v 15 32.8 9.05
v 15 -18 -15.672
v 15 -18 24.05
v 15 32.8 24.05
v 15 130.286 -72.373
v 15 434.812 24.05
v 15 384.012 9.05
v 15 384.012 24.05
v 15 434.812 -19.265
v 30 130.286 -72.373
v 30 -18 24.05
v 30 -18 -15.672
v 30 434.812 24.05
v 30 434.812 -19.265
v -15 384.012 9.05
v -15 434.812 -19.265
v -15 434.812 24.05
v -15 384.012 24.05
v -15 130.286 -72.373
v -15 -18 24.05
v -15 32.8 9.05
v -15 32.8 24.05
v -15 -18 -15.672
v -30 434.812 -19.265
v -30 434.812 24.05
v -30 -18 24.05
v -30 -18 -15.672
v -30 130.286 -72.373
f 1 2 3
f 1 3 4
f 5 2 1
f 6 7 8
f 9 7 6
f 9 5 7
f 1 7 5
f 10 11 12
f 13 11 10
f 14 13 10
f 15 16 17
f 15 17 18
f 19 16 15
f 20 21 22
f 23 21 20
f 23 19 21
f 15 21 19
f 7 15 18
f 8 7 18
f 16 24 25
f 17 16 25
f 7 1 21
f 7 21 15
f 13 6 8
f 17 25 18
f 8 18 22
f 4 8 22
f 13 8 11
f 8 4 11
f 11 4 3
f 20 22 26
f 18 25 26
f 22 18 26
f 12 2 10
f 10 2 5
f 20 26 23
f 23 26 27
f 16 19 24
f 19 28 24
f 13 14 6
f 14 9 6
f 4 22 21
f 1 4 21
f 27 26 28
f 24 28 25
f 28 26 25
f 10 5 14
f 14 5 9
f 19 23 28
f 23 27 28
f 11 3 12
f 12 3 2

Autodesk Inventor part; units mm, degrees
ref_plane "YZ Plane" through (0, 0, 0) normal (1, 0, 0) x (0, 1, 0)
ref_plane "XZ Plane" through (0, 0, 0) normal (0, 1, 0) x (-1, 0, 0)
ref_plane "XY Plane" through (0, 0, 0) normal (0, 0, 1) x (1, 0, 0)
sketch "BoundingBox" plane through (0, 0, 0) normal (1, 0, 0) x (0, 1, 0)
  line L0 (434.8115, 24.0504) -> (-18, 24.0504)
  line L1 (-18, 24.0504) -> (-18, -15.6719)
  line L2 (-18, -15.6719) -> (130.2861, -72.3729)
  line L3 (130.2861, -72.3729) -> (434.8115, -19.2646)
  line L4 (434.8115, -19.2646) -> (434.8115, 24.0504)
  point P0 (0, 0)
  point P1 (417.3115, 0.6447)
  point P2 (-18, 4.1892)
  dimension "d5" = 24.0504
  dimension "d6" = 4.1893
  dimension "d7" = 110.926
  dimension "d8" = 452.8115
  dimension "d9" = 39.7223
  dimension "d10" = 43.315
  dimension "d11" = 99.893
  dimension "d12" = 56.7009
  dimension "d13" = 17.5
  dimension "d14" = 23.4057
extrude "BoundingBoxFeature" add sketch "BoundingBox" along normal mid plane 60
sketch "ForearmSpace" plane through (0, 0, 0) normal (0, 0, 1) x (1, 0, 0)
  line L0 (15, 142.9861) -> (-15, 142.9861)
  line L1 (-15, 142.9861) -> (-15, 434.8115)
  line L2 (-15, 434.8115) -> (15, 434.8115)
  line L3 (15, 434.8115) -> (15, 142.9861)
  line L4 (-30, 434.8115) -> (30, 434.8115) projected
  line L5 (0, -86.9623) -> (0, 521.7738) projected
  line L6 (30, 130.2861) -> (30, 434.8115) projected
  line L7 (-30, 130.2861) -> (30, 130.2861) projected
  line L8 (-30, 434.8115) -> (-30, 130.2861) projected
  line L9 (15, 142.9861) -> (-15, 142.9861)
  line L10 (-15, 142.9861) -> (-15, -18)
  line L11 (-15, -18) -> (15, -18)
  line L12 (15, -18) -> (15, 142.9861)
  line L13 (-30, -18) -> (30, -18) projected
  point P0 (0, 0)
  point P1 (-30, 282.5488)
  point P2 (0, 142.9861)
  dimension "d19" = 12.7
  dimension "d21" = 30
extrude "ForearmCutFeature" cut sketch "ForearmSpace" along normal through all both and the other way through all contours L12 L7 L5 L0 | L0 L5 L2 L3 | L5 L7 L10 L0 | L0 L1 L2 L5 | L12 L11 L5 L7 | L5 L11 L10 L7
sketch "Sketch4" plane through (30, 0, 0) normal (1, 0, 0) x (0, 0, -1)
  line L0 (-24.0504, 434.8115) -> (-24.0504, -18) projected
  line L1 (-24.0504, 32.8) -> (-9.0504, 32.8)
  line L2 (-9.0504, 32.8) -> (-9.0504, 384.0115)
  line L3 (-9.0504, 384.0115) -> (-24.0504, 384.0115)
  line L4 (-24.0504, 384.0115) -> (-24.0504, 32.8)
  line L5 (-24.0504, -18) -> (15.6719, -18) projected
  line L6 (19.2646, 434.8115) -> (-24.0504, 434.8115) projected
  point P0 (0, 0)
  dimension "d25" = 15
  dimension "d26" = 50.8
  dimension "d27" = 50.8
extrude "Extrusion3" add sketch "Sketch4" against normal up to surface (45 mm away)
properties part number "UpperArmBoundingBox"
